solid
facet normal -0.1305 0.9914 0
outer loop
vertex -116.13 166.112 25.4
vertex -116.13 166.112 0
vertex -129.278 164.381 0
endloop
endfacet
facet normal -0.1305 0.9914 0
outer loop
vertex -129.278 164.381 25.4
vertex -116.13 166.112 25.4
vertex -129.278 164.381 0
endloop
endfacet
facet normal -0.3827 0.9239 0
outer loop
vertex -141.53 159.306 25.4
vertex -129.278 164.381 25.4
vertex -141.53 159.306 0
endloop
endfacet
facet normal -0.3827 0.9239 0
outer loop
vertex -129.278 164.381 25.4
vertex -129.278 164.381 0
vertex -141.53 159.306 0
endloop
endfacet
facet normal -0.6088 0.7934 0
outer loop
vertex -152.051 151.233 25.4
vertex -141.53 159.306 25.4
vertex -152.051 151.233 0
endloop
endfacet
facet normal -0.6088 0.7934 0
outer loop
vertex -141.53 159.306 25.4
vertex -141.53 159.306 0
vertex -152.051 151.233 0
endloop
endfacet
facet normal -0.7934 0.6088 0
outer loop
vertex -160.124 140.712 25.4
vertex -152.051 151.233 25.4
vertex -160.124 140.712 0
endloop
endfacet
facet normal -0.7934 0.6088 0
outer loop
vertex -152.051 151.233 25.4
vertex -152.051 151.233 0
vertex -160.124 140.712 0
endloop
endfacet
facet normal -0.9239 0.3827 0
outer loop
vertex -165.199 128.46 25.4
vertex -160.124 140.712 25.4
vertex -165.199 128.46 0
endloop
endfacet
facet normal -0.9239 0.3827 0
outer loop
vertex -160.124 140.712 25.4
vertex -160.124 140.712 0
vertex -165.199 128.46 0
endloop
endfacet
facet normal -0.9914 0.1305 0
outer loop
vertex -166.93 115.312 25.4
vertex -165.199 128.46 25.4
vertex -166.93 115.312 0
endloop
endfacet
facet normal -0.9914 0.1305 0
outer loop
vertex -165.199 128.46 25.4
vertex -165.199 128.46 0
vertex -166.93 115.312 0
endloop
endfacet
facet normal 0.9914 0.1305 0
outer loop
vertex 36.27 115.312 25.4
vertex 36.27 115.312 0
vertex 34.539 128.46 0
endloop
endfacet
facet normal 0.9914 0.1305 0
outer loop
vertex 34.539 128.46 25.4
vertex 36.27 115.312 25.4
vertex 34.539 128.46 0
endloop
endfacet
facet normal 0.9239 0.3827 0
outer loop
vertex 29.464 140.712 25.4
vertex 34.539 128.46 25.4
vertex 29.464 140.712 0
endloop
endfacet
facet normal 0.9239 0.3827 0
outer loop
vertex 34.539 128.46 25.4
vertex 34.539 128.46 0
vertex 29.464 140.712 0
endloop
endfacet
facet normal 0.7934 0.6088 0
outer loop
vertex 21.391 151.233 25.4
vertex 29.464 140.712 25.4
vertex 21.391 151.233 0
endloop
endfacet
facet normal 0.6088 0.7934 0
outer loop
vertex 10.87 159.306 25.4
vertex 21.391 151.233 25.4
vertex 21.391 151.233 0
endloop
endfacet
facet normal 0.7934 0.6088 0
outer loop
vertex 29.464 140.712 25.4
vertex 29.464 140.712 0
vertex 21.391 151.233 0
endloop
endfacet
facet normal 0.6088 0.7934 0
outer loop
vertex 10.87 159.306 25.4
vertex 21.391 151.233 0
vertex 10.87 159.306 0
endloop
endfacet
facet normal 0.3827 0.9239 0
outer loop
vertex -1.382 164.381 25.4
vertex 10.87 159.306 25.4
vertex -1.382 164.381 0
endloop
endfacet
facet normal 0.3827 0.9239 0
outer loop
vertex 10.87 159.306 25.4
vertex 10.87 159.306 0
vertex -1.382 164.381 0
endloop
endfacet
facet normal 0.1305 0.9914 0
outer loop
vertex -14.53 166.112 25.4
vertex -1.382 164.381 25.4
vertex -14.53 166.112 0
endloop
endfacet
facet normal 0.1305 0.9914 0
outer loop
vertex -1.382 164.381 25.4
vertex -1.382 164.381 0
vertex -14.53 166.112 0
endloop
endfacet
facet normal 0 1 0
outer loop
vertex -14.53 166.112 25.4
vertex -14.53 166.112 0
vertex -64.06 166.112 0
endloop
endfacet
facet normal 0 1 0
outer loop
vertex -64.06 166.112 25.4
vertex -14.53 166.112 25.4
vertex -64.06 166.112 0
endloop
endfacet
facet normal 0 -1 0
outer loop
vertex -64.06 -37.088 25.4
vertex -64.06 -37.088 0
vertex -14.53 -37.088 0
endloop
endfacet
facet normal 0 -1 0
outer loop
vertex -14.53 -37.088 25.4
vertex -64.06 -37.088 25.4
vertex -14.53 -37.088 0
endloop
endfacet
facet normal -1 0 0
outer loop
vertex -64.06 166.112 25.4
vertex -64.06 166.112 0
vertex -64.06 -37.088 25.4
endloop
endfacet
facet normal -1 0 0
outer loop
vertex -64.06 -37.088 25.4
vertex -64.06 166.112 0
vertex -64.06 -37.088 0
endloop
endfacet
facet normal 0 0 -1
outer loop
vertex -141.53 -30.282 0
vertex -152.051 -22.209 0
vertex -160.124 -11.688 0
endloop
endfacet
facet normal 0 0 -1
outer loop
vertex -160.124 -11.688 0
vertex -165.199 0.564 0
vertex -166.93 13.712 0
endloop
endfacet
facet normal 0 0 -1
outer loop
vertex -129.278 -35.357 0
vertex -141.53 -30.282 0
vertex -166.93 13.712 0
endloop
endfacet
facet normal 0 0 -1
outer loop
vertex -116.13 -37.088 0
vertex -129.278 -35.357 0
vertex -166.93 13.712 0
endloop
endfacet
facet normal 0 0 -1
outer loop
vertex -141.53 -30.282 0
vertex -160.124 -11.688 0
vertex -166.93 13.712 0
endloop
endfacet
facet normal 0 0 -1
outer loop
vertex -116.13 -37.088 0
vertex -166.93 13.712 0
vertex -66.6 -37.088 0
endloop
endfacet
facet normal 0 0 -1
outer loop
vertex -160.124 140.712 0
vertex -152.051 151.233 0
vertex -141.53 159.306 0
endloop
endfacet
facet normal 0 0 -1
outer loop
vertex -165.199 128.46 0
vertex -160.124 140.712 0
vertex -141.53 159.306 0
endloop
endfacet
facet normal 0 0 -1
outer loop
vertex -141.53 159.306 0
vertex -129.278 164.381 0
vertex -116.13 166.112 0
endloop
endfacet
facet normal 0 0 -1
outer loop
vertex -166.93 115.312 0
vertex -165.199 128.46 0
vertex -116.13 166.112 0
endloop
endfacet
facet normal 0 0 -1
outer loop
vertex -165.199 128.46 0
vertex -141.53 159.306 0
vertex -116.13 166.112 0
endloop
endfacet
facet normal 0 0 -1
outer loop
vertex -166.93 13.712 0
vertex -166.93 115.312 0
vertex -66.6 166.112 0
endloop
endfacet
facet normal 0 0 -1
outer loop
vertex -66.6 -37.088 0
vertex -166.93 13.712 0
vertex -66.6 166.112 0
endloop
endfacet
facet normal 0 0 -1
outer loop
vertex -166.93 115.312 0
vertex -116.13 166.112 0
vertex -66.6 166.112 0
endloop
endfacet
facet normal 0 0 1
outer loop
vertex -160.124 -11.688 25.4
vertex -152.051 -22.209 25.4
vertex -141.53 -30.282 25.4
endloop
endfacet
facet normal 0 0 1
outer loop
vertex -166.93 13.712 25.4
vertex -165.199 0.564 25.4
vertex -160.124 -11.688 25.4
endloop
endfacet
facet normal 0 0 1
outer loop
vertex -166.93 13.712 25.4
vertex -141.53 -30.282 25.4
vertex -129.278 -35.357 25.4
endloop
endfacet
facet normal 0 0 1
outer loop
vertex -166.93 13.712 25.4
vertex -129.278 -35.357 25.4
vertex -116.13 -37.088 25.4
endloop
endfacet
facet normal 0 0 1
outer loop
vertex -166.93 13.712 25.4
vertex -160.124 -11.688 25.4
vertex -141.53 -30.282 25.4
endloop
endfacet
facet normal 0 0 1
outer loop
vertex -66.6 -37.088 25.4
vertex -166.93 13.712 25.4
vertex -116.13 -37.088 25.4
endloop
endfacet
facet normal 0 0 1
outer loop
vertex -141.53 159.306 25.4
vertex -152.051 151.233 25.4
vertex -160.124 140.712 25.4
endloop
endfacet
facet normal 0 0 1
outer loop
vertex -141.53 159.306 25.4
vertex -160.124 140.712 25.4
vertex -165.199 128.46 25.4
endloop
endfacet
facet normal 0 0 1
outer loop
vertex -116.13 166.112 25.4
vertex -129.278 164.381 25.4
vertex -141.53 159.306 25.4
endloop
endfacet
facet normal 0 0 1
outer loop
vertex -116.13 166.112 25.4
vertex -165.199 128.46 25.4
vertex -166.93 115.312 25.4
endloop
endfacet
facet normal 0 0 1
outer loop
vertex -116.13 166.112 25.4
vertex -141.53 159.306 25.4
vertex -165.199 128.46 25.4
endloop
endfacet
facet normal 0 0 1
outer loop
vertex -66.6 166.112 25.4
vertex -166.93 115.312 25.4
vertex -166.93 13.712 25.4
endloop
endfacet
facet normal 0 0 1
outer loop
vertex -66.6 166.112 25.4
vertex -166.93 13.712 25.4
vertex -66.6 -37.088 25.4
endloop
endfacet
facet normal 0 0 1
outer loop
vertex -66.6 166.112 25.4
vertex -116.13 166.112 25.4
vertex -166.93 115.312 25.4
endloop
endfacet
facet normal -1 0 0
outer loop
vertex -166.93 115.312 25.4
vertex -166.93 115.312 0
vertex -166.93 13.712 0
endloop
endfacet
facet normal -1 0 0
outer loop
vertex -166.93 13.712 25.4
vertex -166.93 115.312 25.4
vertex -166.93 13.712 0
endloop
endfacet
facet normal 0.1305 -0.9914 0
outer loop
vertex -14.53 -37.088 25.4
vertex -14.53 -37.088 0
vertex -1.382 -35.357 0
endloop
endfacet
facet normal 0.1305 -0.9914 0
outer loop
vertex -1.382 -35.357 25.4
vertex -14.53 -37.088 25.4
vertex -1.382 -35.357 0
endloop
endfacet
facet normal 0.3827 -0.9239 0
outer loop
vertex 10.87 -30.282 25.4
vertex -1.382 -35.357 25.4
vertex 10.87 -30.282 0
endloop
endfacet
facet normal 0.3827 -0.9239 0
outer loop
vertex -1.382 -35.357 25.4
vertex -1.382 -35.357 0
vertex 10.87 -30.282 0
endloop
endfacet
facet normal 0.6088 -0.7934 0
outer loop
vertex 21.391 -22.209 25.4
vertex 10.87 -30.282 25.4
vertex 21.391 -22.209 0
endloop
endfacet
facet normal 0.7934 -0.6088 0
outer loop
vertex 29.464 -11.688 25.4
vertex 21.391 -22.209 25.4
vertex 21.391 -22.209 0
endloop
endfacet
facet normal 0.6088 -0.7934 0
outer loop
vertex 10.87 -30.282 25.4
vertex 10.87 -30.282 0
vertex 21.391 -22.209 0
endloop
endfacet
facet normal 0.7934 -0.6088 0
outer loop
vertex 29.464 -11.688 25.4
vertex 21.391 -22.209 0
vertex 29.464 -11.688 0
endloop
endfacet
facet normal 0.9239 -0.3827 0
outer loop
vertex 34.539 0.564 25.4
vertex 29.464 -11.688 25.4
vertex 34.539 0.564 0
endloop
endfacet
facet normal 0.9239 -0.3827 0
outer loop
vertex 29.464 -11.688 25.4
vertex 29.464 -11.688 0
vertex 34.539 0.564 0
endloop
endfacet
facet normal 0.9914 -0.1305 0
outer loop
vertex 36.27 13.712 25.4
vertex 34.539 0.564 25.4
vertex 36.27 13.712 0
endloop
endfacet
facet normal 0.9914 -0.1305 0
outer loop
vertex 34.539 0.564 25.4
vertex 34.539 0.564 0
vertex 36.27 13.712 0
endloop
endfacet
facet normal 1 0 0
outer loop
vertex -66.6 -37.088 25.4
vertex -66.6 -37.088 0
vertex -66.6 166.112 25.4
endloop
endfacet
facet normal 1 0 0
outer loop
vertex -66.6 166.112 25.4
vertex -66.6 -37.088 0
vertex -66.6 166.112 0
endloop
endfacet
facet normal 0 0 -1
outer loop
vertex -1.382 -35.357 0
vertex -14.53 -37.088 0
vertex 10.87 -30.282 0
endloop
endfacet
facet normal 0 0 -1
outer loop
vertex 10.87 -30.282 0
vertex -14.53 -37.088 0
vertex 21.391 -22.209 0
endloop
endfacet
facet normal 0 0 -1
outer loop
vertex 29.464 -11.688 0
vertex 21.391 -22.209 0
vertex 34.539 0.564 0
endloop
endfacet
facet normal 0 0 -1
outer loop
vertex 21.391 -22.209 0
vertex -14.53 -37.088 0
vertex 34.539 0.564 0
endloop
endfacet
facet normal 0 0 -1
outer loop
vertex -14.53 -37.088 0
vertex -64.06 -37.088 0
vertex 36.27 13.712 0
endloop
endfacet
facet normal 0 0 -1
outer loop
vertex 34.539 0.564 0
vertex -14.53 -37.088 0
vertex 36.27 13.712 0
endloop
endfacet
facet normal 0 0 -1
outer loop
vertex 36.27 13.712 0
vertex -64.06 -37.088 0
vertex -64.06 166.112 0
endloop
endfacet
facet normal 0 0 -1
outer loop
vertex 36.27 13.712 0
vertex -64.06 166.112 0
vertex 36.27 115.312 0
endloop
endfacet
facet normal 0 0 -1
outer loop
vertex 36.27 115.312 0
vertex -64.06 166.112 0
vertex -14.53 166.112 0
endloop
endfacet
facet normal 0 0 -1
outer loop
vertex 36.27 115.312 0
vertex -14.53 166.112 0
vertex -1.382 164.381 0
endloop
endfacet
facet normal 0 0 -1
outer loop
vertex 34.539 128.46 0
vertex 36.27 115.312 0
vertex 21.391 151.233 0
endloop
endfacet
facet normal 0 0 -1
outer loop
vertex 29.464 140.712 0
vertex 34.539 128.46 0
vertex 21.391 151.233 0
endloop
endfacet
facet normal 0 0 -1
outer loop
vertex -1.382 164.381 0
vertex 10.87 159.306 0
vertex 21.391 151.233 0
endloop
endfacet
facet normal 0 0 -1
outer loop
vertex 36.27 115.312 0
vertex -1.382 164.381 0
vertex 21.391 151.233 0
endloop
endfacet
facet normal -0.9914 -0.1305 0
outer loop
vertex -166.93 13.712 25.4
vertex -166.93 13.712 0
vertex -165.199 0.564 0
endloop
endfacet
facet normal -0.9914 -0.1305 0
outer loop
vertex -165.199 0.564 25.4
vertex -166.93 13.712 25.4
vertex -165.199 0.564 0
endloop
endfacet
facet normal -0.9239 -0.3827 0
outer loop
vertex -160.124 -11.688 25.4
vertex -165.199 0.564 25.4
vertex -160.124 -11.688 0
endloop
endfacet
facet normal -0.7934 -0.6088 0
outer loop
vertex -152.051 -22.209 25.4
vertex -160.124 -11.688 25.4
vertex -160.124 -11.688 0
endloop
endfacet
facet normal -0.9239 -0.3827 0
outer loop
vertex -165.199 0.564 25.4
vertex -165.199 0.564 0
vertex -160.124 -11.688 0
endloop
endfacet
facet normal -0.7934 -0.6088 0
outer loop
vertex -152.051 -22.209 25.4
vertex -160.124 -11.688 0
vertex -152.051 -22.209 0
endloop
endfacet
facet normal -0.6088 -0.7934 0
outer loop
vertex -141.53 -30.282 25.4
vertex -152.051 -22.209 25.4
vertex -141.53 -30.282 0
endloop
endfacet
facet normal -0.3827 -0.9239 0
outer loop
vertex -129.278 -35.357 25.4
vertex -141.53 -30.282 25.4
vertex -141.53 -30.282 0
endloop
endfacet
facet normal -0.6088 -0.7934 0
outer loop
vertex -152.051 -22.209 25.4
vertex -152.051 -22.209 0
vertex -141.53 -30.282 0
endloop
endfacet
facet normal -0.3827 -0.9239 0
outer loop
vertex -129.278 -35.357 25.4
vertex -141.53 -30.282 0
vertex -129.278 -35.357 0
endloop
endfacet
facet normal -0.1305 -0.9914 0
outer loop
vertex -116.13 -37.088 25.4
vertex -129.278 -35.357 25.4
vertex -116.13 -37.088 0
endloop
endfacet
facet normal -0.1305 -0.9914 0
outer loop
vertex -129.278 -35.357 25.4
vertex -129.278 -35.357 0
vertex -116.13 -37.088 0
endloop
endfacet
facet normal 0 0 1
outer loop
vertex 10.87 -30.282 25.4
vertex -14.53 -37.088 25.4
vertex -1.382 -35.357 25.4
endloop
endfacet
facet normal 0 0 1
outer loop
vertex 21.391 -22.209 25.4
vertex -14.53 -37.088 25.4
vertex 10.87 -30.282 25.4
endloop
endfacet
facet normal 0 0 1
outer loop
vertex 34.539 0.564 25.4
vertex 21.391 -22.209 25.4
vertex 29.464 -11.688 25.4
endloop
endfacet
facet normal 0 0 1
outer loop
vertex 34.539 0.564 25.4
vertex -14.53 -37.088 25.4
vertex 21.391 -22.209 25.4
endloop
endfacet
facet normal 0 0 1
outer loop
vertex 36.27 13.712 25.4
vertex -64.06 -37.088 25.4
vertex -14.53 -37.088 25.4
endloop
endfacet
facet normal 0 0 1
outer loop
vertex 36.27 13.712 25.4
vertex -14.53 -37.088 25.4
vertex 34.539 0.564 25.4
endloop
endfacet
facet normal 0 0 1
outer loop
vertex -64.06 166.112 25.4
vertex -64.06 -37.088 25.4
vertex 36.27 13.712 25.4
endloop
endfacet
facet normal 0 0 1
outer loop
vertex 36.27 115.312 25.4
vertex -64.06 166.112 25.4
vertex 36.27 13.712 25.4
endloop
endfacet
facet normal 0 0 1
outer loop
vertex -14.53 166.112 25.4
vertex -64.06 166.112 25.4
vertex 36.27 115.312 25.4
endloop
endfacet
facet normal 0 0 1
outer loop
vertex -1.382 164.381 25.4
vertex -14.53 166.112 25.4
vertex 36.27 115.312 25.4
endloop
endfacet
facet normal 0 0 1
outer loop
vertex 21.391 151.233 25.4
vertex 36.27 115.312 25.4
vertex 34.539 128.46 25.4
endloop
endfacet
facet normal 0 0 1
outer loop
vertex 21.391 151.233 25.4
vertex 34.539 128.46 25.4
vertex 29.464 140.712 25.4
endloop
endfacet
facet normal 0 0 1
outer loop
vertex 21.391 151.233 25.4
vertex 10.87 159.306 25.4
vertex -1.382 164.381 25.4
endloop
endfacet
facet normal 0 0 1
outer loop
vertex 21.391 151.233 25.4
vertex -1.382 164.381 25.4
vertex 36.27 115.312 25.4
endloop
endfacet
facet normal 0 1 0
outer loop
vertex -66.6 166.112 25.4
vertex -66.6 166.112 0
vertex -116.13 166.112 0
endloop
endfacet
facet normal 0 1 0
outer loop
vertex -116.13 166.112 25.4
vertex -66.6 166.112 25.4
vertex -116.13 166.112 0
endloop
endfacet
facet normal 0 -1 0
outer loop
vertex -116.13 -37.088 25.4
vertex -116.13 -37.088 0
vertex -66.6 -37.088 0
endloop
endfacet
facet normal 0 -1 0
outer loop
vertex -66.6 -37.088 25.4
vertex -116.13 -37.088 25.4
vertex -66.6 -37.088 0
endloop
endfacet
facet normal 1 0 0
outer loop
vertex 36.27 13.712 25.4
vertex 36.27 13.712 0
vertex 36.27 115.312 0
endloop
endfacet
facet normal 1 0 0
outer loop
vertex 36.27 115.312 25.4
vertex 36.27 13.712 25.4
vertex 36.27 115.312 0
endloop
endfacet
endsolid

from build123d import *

# Parameters (mm, degrees)
F0_R     = 25.4
F1_DEPTH = 25.4


# Not quite as in the source:
# - the program builds the solid bodies; features that only make, move or delete a surface that nothing else refers to are left out


with BuildPart() as f1:
    # F0 (on Top) → F1 (new body)
    with BuildSketch(Plane.XY):
        with BuildLine():
            Line((-66.6004060161, 166.1117917925), (-116.1304060161, 166.1117917925))
            ThreePointArc((-116.1304060161, 166.1117917925), (-152.0514305004, 151.2328162768), (-166.9304060161, 115.3117917925))
            Line((-166.9304060161, 115.3117917925), (-166.9304060161, 13.7117917925))
            ThreePointArc((-166.9304060161, 13.7117917925), (-152.0514305004, -22.2092326918), (-116.1304060161, -37.0882082075))
            Line((-116.1304060161, -37.0882082075), (-66.6004060161, -37.0882082075))
            Line((-66.6004060161, -37.0882082075), (-66.6004060161, 166.1117917925))
        make_face()
        with Locations((-116.1304060161, 115.3117917925)):
            Circle(F0_R, mode=Mode.SUBTRACT)
        with Locations((-116.1304060161, 115.3117917925)):
            Circle(F0_R)
    extrude(amount=F1_DEPTH)


with BuildPart() as f1b:
    # F0 (on Top) → F1, piece 2 (new body)
    with BuildSketch(Plane.XY):
        with BuildLine():
            Line((-14.5304060161, 166.1117917925), (-64.0604060161, 166.1117917925))
            Line((-64.0604060161, 166.1117917925), (-64.0604060161, -37.0882082075))
            Line((-64.0604060161, -37.0882082075), (-14.5304060161, -37.0882082075))
            ThreePointArc((-14.5304060161, -37.0882082075), (21.3906184682, -22.2092326918), (36.2695939839, 13.7117917925))
            Line((36.2695939839, 13.7117917925), (36.2695939839, 115.3117917925))
            ThreePointArc((36.2695939839, 115.3117917925), (21.3906184682, 151.2328162768), (-14.5304060161, 166.1117917925))
        make_face()
        with Locations((-14.5304060161, 13.7117917925)):
            Circle(F0_R, mode=Mode.SUBTRACT)
        with Locations((-14.5304060161, 13.7117917925)):
            Circle(F0_R)
    extrude(amount=F1_DEPTH)


solid = Compound([f1.part, f1b.part])
